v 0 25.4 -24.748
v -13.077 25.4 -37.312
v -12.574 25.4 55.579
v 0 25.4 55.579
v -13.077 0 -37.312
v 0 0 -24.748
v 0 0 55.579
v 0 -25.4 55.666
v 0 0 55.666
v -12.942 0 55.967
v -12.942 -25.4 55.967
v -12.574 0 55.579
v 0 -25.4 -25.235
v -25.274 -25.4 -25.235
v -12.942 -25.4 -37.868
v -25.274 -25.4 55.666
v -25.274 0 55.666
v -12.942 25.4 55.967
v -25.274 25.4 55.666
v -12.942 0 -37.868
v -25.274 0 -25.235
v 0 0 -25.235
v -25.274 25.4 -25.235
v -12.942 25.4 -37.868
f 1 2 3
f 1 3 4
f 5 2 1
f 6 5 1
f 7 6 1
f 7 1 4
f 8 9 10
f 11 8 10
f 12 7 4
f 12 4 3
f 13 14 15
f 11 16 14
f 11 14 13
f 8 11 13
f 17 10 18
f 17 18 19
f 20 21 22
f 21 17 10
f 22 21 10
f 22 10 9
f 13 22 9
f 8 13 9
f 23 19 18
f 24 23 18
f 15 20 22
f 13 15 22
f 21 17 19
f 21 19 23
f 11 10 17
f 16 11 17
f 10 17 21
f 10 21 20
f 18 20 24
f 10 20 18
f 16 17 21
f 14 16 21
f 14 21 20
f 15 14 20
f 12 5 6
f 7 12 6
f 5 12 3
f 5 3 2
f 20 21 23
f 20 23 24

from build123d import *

# Parameters (mm, degrees)
F1_DEPTH = 25.4
F3_DEPTH = 25.4


with BuildPart() as f1:
    # F0 (on Front) → F1 (new body)
    with BuildSketch(Plane.XZ):
        Polygon((-12.9417075639, 55.9666713831), (-25.2744760364, 55.6658692658), (-25.2744760364, -25.2348184586), (-12.9417075639, -37.8683881451), align=None)
        Polygon((0, 55.6658692658), (-12.9417075639, 55.9666713831), (-12.9417075639, -37.8683881451), (0, -25.2348184586), align=None)
    extrude(amount=F1_DEPTH)


with BuildPart() as f3:
    # F0 (on Front) → F3 (new body)
    with BuildSketch(Plane.XZ):
        Polygon((-12.9417075639, 55.9666713831), (-25.2744760364, 55.6658692658), (-25.2744760364, -25.2348184586), (-12.9417075639, -37.8683881451), align=None)
    extrude(amount=-F3_DEPTH)


with BuildPart() as f3b:
    # F2 (on Front) → F3, piece 2 (new body)
    with BuildSketch(Plane.XZ):
        Polygon((0, -24.7484948486), (0, 55.5793456733), (-12.573570013, 55.5793456733), (-13.0771576072, -37.3119761499), align=None)
    extrude(amount=-F3_DEPTH)


solid = Compound([f1.part, f3.part, f3b.part])
